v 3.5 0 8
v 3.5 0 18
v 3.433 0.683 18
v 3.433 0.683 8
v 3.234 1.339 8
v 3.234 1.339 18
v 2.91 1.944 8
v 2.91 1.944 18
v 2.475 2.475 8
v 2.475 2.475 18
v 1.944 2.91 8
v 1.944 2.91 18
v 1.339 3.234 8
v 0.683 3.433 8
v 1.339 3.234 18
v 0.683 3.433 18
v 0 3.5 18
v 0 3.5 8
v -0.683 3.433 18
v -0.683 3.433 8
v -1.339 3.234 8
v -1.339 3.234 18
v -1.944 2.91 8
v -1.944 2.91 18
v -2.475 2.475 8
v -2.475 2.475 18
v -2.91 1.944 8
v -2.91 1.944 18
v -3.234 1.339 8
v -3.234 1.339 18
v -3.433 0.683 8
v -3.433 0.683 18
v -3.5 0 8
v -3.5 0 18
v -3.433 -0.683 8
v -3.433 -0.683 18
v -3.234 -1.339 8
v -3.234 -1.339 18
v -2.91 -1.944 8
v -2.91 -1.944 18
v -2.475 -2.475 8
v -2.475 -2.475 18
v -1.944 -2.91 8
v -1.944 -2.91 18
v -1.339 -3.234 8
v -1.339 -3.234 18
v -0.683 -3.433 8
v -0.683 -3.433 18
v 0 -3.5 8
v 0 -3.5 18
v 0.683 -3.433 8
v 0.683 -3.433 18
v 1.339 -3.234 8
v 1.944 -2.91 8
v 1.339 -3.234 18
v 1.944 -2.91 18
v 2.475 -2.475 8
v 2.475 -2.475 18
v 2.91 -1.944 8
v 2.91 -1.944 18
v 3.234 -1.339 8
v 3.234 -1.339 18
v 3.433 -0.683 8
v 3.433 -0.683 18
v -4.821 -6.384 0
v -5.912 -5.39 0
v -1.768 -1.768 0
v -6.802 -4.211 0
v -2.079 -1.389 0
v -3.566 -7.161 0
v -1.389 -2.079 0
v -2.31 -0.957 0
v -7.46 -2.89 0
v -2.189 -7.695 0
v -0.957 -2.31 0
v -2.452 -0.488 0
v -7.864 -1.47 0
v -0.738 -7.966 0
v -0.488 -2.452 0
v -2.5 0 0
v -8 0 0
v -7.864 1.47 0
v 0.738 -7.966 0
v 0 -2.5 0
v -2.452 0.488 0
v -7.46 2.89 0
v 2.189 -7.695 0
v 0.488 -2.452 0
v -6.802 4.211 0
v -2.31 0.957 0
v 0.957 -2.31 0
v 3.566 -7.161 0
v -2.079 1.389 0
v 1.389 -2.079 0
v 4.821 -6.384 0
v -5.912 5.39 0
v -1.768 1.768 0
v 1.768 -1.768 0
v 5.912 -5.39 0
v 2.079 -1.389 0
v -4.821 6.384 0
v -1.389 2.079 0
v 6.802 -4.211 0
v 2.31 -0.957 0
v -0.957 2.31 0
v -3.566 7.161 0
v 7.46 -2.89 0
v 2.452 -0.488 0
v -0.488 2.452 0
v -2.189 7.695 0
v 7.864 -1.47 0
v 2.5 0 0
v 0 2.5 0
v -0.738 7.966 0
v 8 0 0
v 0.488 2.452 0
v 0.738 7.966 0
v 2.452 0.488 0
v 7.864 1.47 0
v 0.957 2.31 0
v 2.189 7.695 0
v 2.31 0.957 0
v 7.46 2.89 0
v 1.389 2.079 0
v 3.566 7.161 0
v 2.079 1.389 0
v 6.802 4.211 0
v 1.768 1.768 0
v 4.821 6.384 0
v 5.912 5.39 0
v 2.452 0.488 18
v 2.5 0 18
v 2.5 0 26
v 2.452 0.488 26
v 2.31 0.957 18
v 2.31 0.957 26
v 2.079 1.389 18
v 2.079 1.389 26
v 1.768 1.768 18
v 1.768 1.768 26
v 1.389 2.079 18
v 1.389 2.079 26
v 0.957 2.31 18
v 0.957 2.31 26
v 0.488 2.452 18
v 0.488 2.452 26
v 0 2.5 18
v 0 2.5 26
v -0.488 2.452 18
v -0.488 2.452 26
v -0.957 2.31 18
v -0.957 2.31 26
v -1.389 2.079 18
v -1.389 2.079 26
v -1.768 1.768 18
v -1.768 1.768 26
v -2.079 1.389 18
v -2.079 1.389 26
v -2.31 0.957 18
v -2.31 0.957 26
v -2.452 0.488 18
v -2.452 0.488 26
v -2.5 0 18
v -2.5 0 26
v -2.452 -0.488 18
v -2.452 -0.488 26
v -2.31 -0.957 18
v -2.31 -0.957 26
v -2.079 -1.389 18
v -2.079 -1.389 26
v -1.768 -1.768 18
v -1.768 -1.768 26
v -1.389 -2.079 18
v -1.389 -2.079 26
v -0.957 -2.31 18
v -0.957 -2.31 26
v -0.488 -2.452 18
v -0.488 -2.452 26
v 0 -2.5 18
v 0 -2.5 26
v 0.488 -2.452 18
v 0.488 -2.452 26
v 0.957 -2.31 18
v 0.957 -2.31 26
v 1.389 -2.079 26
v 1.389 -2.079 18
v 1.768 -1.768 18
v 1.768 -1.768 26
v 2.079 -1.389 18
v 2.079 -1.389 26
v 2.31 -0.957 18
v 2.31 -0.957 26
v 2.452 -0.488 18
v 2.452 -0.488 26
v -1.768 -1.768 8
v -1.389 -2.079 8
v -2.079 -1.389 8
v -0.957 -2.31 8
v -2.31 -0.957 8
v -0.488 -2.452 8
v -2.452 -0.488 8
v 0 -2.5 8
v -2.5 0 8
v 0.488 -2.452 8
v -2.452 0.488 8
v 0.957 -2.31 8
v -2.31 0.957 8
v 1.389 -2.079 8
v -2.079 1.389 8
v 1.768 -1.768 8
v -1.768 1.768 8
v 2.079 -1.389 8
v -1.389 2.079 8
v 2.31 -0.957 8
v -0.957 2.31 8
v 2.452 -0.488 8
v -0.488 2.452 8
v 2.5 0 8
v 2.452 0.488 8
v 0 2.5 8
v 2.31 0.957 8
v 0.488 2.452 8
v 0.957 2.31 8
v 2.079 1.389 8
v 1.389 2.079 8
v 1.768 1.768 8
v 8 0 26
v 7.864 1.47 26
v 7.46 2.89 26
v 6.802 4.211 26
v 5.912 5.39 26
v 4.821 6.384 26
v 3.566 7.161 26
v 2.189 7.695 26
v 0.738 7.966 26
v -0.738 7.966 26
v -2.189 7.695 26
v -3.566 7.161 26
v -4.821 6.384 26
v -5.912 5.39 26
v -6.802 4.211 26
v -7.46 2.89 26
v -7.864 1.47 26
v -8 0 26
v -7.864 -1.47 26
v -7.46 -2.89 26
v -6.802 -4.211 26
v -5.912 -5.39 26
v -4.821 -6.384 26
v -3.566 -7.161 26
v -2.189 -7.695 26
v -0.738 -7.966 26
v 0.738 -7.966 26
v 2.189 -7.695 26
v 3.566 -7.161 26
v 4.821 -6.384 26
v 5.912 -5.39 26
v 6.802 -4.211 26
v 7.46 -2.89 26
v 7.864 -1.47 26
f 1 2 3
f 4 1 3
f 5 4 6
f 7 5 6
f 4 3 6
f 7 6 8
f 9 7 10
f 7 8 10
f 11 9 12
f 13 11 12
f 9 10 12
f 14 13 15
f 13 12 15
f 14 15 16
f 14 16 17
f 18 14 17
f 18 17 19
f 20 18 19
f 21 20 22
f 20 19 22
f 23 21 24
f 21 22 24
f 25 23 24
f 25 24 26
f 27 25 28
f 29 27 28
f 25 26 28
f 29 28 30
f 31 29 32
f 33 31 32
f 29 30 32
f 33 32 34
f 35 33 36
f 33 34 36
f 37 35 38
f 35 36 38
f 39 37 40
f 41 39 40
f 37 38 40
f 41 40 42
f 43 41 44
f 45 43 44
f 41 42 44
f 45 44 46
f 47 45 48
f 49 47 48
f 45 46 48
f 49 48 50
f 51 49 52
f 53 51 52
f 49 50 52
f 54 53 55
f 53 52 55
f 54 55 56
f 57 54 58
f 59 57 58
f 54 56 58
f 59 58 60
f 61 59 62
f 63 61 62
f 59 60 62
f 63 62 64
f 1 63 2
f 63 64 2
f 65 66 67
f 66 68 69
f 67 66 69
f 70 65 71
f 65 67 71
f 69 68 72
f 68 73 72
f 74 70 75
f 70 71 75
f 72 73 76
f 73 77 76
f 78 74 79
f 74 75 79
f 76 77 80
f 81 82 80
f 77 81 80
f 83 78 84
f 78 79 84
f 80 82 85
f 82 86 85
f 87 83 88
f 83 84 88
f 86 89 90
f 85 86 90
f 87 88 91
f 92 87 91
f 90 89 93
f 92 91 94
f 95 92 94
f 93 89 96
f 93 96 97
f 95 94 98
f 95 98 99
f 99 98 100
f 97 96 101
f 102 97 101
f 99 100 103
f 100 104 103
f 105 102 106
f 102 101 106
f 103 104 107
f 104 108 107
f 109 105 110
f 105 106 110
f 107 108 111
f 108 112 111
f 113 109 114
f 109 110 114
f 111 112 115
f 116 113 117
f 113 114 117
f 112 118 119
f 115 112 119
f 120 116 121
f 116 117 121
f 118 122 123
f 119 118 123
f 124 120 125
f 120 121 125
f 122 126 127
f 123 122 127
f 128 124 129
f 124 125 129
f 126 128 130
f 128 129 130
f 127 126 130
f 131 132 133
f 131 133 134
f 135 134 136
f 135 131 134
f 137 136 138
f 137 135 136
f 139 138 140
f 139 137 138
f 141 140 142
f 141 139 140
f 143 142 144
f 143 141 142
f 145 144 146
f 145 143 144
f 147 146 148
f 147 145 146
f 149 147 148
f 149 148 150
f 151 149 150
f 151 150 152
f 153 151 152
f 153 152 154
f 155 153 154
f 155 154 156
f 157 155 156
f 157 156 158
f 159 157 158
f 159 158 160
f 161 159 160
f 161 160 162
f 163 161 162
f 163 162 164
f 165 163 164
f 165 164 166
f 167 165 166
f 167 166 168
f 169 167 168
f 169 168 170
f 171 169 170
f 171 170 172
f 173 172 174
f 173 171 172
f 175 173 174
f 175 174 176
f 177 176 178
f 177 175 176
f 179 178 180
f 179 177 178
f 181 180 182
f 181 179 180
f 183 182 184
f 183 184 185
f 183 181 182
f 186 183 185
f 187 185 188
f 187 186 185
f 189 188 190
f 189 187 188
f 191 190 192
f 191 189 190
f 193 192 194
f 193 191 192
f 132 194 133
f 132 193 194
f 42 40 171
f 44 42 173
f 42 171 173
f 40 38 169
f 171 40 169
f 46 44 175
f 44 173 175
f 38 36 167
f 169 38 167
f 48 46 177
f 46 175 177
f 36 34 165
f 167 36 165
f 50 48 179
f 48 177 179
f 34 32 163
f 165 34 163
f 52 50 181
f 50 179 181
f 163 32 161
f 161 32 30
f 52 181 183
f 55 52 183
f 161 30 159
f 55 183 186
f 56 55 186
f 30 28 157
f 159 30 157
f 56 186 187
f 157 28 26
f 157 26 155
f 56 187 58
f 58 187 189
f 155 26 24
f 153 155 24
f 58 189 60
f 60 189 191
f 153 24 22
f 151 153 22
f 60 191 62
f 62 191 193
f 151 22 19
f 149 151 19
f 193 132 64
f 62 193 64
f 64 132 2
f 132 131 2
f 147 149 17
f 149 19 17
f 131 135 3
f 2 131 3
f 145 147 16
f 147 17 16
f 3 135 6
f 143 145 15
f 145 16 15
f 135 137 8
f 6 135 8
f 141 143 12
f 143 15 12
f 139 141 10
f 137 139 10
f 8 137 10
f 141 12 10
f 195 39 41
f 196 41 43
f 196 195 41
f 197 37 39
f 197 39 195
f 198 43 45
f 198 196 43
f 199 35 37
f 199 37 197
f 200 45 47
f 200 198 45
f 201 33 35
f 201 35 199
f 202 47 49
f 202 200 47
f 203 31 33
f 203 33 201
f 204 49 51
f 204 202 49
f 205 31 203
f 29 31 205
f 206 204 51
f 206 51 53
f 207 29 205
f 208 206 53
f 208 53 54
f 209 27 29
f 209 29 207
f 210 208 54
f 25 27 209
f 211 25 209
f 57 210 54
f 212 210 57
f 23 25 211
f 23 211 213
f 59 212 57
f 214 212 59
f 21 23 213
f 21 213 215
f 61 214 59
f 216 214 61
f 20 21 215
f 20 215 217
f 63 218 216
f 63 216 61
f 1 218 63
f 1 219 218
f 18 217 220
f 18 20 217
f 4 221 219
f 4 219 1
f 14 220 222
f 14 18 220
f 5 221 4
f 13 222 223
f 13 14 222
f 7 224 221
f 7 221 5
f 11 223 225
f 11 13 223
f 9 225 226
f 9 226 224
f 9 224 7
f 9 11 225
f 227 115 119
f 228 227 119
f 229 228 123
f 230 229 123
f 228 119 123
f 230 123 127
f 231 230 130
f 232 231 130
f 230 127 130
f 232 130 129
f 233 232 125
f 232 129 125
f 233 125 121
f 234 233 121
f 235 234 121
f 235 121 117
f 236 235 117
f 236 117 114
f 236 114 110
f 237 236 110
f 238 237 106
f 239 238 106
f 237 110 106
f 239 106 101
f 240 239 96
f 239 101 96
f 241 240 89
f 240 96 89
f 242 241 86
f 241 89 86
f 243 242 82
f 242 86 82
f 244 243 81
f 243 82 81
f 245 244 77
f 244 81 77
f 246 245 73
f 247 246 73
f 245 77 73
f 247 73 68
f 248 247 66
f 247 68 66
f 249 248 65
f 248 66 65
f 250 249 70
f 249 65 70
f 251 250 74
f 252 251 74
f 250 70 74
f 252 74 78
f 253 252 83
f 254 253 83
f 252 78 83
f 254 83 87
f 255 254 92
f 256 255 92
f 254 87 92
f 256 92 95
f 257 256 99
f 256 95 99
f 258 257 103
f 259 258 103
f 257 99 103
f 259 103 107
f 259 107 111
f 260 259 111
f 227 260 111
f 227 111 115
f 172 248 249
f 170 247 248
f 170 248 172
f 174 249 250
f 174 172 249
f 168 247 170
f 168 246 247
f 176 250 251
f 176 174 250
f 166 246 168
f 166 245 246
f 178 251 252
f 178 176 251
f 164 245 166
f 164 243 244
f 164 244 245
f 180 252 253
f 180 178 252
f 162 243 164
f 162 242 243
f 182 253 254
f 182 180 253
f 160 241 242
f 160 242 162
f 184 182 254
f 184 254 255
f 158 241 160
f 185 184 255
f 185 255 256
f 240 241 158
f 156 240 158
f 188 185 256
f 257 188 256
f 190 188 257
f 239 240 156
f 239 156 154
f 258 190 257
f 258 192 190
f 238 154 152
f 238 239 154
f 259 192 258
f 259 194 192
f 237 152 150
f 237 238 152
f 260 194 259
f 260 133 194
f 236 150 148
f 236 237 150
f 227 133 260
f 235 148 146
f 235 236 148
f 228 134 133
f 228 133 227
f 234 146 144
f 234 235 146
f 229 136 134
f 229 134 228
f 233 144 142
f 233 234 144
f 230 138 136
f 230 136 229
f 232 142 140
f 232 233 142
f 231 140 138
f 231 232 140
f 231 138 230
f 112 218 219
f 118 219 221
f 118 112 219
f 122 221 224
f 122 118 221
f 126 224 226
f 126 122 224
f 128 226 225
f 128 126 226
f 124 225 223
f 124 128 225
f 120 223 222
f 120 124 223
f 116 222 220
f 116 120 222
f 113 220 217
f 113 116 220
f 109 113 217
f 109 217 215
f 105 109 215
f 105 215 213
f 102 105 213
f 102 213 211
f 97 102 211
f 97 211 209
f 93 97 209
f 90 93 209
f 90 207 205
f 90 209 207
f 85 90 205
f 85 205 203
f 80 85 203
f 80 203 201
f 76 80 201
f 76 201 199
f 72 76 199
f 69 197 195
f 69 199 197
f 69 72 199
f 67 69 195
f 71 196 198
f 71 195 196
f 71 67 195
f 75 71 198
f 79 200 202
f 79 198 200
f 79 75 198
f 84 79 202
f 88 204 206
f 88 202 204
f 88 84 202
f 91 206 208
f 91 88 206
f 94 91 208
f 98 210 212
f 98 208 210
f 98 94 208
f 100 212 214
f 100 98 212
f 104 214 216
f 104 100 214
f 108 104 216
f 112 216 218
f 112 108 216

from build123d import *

# Parameters (mm, degrees)
SKETCH1_R           = 8
SKETCH1_R_2         = 2.5
BOSS_EXTRUDE1_DEPTH = 26
SKETCH2_R           = 3.5
CUT_EXTRUDE1_DEPTH  = 10


with BuildPart() as part:
    # Sketch1 → Boss-Extrude1 (new body)
    with BuildSketch(Plane.XY):
        Circle(SKETCH1_R)
        Circle(SKETCH1_R_2, mode=Mode.SUBTRACT)
    extrude(amount=BOSS_EXTRUDE1_DEPTH)

    # Sketch2 → Cut-Extrude1 (cut)
    with BuildSketch(Plane.XY.offset(18)):
        Circle(SKETCH2_R)
    extrude(amount=-CUT_EXTRUDE1_DEPTH, mode=Mode.SUBTRACT)


solid = part.part
